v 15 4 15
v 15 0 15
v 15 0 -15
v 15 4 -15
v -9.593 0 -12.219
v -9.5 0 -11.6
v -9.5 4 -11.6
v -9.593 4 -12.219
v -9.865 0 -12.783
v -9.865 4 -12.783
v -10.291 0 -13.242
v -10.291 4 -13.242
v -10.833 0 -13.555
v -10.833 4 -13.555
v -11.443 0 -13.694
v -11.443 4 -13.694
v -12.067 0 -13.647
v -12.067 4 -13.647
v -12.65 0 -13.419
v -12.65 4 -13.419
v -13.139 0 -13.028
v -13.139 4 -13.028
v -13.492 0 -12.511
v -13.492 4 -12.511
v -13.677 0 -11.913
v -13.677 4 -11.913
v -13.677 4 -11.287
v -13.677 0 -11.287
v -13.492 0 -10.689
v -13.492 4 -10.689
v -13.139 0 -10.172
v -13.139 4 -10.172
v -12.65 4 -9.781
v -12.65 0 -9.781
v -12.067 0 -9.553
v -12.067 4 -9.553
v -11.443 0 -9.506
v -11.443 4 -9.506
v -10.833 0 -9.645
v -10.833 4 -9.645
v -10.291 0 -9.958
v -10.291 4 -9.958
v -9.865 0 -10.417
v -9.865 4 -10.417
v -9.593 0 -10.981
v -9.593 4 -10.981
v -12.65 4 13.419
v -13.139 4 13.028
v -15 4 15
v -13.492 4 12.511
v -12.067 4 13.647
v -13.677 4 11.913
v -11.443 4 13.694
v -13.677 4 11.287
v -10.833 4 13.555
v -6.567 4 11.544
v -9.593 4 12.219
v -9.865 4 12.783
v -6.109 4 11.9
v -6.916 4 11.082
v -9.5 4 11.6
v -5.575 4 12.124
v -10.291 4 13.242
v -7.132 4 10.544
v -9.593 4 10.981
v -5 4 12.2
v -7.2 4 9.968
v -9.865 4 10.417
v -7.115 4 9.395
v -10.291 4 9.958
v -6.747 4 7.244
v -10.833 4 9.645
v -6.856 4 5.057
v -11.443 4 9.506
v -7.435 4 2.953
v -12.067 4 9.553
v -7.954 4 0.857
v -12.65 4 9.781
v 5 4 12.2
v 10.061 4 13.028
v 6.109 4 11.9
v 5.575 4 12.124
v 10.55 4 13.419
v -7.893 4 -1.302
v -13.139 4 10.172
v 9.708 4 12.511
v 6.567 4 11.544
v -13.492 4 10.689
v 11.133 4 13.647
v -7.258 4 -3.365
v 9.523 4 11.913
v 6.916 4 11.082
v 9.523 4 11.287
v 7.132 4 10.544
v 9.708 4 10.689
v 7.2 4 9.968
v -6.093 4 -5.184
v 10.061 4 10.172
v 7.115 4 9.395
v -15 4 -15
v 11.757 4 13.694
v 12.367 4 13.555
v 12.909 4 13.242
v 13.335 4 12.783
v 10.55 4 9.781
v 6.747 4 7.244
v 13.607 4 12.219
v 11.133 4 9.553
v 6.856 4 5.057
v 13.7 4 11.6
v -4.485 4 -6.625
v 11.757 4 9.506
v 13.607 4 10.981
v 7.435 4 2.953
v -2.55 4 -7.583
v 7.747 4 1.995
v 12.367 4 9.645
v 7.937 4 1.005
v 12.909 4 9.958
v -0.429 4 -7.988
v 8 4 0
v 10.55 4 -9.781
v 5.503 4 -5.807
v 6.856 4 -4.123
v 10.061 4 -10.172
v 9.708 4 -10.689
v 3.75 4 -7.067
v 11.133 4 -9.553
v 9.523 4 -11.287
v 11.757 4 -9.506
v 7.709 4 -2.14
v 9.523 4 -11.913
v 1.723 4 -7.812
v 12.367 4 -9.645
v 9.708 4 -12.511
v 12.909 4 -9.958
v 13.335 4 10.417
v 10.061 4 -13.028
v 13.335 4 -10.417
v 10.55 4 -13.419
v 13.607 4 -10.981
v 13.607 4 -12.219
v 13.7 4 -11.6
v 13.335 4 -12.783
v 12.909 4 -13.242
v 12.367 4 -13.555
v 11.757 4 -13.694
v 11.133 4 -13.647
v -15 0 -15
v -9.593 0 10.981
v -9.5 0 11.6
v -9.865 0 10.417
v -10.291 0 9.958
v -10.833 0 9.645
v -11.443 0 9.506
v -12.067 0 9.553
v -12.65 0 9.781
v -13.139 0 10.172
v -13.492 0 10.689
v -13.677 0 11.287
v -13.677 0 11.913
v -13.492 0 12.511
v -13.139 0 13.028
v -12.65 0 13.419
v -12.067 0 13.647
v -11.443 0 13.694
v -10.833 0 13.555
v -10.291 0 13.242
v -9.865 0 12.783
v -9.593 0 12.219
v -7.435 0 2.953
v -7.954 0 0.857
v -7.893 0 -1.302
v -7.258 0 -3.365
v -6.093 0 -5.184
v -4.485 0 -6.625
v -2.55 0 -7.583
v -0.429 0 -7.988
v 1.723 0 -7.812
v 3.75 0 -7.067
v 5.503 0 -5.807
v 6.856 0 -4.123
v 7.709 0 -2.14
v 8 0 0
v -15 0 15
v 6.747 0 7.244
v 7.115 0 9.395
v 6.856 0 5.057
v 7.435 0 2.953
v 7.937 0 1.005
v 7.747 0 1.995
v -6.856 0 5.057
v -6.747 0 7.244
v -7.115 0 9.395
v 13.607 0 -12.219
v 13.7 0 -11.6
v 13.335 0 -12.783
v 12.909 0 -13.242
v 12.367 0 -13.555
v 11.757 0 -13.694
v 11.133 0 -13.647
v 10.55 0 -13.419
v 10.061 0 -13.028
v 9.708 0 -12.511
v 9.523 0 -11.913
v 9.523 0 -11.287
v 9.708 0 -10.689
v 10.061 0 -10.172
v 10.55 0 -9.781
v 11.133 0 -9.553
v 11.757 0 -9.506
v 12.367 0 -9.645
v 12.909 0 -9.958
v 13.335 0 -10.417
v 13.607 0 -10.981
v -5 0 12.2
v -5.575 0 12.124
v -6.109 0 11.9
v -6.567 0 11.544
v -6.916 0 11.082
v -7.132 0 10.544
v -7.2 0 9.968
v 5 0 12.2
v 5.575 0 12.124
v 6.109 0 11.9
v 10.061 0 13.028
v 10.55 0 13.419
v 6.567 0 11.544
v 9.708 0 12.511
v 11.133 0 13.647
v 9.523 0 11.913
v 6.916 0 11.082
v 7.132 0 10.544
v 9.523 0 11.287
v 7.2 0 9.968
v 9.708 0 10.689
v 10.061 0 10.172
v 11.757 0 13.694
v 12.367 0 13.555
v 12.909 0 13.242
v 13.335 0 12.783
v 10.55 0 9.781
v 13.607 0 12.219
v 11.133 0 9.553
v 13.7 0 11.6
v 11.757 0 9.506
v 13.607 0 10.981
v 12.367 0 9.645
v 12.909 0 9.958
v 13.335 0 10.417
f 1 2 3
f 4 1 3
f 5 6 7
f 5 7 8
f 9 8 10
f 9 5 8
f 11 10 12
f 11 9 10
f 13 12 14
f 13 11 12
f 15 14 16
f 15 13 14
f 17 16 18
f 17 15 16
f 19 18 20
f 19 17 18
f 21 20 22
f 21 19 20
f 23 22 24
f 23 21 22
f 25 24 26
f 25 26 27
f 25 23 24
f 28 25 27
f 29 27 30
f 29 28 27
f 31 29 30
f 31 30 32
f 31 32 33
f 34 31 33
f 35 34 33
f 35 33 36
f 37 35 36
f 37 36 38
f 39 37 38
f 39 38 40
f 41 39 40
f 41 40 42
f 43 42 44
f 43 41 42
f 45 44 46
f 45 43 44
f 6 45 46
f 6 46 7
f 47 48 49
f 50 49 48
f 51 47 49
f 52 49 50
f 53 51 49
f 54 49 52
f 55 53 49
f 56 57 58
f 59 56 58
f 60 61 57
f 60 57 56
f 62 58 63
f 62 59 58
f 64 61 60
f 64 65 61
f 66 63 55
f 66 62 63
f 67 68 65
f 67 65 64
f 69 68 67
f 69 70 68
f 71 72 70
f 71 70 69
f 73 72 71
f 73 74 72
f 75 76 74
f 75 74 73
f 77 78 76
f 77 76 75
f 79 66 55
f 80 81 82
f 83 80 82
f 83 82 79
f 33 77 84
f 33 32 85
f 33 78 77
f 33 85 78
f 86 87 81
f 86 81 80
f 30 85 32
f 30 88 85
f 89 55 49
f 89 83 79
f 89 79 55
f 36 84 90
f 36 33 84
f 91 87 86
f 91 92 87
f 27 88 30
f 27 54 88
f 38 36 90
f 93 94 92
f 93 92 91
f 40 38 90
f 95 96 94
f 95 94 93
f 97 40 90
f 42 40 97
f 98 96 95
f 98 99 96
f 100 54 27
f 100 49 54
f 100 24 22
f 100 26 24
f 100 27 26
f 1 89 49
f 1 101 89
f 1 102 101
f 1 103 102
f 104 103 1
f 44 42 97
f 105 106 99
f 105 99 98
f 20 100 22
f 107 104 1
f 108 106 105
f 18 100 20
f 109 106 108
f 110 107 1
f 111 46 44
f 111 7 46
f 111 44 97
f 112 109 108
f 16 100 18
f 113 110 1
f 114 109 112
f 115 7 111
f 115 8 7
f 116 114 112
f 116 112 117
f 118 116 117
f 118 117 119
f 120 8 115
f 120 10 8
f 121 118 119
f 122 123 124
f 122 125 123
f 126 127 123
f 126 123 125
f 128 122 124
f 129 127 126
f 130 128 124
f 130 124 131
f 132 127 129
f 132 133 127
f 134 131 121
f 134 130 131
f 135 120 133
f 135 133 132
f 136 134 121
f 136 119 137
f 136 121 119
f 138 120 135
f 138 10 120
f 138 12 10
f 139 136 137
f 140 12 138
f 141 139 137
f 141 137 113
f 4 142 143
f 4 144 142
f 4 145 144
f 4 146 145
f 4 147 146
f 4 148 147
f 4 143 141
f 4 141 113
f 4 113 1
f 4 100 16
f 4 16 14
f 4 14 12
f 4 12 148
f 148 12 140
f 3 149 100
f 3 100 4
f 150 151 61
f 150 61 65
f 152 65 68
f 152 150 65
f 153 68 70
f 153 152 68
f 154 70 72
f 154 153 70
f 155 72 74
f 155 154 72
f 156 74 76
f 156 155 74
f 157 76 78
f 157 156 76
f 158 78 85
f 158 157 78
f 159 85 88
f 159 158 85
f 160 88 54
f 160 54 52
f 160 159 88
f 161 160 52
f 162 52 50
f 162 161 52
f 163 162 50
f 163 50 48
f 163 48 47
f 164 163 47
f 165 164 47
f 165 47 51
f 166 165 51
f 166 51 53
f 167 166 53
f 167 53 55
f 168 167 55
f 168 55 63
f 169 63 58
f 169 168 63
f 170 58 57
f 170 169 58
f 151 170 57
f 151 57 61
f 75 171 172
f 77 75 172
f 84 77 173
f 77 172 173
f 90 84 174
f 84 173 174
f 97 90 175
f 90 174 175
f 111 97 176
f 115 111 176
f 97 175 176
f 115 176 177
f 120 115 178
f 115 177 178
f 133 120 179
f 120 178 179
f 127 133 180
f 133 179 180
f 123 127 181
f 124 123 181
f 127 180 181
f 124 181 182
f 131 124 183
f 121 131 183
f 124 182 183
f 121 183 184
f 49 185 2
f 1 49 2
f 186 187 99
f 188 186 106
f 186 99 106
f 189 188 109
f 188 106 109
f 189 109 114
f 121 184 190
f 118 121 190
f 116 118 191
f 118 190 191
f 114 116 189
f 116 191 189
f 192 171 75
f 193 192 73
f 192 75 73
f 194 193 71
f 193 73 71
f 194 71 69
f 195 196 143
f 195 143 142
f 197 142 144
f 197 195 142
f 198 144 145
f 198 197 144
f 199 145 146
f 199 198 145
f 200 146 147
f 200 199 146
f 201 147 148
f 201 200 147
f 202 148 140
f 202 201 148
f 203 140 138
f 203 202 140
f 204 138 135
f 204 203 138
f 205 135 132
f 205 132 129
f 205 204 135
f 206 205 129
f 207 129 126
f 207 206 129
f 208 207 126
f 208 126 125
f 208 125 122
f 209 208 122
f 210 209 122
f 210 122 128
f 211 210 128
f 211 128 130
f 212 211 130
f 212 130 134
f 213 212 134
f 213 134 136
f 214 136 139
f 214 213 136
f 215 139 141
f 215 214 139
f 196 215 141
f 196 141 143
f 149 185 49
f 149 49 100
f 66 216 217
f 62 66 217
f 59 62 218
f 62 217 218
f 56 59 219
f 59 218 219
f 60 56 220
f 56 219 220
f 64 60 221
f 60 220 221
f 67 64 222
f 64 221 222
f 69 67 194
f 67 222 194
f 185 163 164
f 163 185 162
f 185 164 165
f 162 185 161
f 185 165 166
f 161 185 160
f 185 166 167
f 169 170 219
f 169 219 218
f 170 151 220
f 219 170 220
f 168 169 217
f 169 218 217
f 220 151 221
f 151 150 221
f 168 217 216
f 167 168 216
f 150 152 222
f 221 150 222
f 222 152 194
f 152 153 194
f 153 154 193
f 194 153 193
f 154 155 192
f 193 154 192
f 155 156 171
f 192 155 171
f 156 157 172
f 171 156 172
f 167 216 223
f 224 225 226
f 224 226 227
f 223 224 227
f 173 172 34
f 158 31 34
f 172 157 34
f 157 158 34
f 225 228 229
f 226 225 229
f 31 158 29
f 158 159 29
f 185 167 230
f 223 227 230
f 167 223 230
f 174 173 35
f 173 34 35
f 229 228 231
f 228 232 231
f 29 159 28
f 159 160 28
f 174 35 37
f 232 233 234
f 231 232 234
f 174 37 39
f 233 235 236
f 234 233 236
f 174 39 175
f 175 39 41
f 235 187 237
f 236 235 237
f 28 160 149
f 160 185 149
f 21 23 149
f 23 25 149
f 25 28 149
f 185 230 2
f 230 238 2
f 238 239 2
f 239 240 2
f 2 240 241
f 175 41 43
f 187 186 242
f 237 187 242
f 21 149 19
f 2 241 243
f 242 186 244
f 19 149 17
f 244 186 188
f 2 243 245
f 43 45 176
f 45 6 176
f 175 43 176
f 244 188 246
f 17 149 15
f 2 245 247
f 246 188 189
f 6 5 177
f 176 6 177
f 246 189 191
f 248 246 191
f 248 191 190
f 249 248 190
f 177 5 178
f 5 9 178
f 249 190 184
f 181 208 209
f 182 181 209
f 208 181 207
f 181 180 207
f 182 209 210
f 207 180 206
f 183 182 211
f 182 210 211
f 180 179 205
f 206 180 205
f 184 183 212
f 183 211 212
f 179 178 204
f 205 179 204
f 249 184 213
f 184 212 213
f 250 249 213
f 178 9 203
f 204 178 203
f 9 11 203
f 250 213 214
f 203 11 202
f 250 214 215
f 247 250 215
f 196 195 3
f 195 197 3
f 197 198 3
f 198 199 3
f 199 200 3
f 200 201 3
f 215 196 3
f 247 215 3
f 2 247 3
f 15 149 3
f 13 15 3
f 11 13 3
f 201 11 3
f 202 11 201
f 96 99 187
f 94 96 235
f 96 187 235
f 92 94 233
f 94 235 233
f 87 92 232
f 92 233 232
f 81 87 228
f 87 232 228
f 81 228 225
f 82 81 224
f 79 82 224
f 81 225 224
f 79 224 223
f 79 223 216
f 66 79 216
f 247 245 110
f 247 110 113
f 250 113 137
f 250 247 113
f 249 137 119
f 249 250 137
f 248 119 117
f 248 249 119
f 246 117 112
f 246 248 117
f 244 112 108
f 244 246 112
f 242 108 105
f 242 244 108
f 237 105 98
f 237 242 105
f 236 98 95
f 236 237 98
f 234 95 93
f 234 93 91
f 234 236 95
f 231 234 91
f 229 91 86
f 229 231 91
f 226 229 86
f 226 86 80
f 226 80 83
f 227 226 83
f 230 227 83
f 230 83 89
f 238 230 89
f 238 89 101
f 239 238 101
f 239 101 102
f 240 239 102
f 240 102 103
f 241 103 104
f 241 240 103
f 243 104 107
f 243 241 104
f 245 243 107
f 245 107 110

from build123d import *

# Parameters (mm, degrees)
SKETCH1_W                          = 30
SKETCH1_H                          = 30
BOSS_EXTRUDE1_DEPTH                = 4
F_4_2_4_2_DIAMETER_HOLE1_OUTLINE_R = 2.1
F_4_2_4_2_DIAMETER_HOLE1_DEPTH     = 4
SKETCH7_R                          = 8
CUT_EXTRUDE1_DEPTH                 = 22.587033145
FILLET1_R                          = 10


# Read off the part's stored shape, not the designer's step: Ø4.2 (4.2) Diameter Hole1
with BuildPart() as part:
    # Sketch1 → Boss-Extrude1 (new body)
    with BuildSketch(Plane(origin=(0, 0, 0), x_dir=(1, 0, 0), z_dir=(0, 1, 0))):
        Rectangle(SKETCH1_W, SKETCH1_H)
    extrude(amount=BOSS_EXTRUDE1_DEPTH)

    # Ø4.2 (4.2) Diameter Hole1 outline → Ø4.2 (4.2) Diameter Hole1 (cut)
    with BuildSketch(Plane(origin=(0, 0, 0), x_dir=(1, 0, 0), z_dir=(0, 1, 0))):
        with Locations((11.6, -11.6)):
            Circle(F_4_2_4_2_DIAMETER_HOLE1_OUTLINE_R)
        with Locations((-11.6, 11.6)):
            Circle(F_4_2_4_2_DIAMETER_HOLE1_OUTLINE_R)
        with Locations((-11.6, -11.6)):
            Circle(F_4_2_4_2_DIAMETER_HOLE1_OUTLINE_R)
        with Locations((11.6, 11.6)):
            Circle(F_4_2_4_2_DIAMETER_HOLE1_OUTLINE_R)
    extrude(amount=F_4_2_4_2_DIAMETER_HOLE1_DEPTH, mode=Mode.SUBTRACT)

    # Sketch7 → Cut-Extrude1 (cut, through all)
    with BuildSketch(Plane.XZ):
        with BuildLine():
            ThreePointArc((1.777638883, 7.8), (0, 8), (-1.777638883, 7.8))
            Line((-1.777638883, 7.8), (1.777638883, 7.8))
        make_face()
        with BuildLine():
            Line((1.777638883, 7.8), (-1.777638883, 7.8))
            ThreePointArc((-1.777638883, 7.8), (-4.988932197, -6.253843261), (8, 0))
            ThreePointArc((8, 0), (6.253843261, 4.988932197), (1.777638883, 7.8))
        make_face()
        Circle(SKETCH7_R)
        with BuildLine():
            Line((-5, 7.8), (5, 7.8))
            ThreePointArc((5, 7.8), (7.2, 10), (5, 12.2))
            Line((5, 12.2), (-5, 12.2))
            ThreePointArc((-5, 12.2), (-7.2, 10), (-5, 7.8))
        make_face()
    extrude(amount=-CUT_EXTRUDE1_DEPTH, mode=Mode.SUBTRACT)

    # Fillet1
    fillet1_edges = [part.edges().sort_by_distance(p)[0] for p in [
        (1.777638883, 2, 7.8),
        (-1.777638883, 2, 7.8),
    ]]
    fillet(fillet1_edges, radius=FILLET1_R)


solid = part.part
